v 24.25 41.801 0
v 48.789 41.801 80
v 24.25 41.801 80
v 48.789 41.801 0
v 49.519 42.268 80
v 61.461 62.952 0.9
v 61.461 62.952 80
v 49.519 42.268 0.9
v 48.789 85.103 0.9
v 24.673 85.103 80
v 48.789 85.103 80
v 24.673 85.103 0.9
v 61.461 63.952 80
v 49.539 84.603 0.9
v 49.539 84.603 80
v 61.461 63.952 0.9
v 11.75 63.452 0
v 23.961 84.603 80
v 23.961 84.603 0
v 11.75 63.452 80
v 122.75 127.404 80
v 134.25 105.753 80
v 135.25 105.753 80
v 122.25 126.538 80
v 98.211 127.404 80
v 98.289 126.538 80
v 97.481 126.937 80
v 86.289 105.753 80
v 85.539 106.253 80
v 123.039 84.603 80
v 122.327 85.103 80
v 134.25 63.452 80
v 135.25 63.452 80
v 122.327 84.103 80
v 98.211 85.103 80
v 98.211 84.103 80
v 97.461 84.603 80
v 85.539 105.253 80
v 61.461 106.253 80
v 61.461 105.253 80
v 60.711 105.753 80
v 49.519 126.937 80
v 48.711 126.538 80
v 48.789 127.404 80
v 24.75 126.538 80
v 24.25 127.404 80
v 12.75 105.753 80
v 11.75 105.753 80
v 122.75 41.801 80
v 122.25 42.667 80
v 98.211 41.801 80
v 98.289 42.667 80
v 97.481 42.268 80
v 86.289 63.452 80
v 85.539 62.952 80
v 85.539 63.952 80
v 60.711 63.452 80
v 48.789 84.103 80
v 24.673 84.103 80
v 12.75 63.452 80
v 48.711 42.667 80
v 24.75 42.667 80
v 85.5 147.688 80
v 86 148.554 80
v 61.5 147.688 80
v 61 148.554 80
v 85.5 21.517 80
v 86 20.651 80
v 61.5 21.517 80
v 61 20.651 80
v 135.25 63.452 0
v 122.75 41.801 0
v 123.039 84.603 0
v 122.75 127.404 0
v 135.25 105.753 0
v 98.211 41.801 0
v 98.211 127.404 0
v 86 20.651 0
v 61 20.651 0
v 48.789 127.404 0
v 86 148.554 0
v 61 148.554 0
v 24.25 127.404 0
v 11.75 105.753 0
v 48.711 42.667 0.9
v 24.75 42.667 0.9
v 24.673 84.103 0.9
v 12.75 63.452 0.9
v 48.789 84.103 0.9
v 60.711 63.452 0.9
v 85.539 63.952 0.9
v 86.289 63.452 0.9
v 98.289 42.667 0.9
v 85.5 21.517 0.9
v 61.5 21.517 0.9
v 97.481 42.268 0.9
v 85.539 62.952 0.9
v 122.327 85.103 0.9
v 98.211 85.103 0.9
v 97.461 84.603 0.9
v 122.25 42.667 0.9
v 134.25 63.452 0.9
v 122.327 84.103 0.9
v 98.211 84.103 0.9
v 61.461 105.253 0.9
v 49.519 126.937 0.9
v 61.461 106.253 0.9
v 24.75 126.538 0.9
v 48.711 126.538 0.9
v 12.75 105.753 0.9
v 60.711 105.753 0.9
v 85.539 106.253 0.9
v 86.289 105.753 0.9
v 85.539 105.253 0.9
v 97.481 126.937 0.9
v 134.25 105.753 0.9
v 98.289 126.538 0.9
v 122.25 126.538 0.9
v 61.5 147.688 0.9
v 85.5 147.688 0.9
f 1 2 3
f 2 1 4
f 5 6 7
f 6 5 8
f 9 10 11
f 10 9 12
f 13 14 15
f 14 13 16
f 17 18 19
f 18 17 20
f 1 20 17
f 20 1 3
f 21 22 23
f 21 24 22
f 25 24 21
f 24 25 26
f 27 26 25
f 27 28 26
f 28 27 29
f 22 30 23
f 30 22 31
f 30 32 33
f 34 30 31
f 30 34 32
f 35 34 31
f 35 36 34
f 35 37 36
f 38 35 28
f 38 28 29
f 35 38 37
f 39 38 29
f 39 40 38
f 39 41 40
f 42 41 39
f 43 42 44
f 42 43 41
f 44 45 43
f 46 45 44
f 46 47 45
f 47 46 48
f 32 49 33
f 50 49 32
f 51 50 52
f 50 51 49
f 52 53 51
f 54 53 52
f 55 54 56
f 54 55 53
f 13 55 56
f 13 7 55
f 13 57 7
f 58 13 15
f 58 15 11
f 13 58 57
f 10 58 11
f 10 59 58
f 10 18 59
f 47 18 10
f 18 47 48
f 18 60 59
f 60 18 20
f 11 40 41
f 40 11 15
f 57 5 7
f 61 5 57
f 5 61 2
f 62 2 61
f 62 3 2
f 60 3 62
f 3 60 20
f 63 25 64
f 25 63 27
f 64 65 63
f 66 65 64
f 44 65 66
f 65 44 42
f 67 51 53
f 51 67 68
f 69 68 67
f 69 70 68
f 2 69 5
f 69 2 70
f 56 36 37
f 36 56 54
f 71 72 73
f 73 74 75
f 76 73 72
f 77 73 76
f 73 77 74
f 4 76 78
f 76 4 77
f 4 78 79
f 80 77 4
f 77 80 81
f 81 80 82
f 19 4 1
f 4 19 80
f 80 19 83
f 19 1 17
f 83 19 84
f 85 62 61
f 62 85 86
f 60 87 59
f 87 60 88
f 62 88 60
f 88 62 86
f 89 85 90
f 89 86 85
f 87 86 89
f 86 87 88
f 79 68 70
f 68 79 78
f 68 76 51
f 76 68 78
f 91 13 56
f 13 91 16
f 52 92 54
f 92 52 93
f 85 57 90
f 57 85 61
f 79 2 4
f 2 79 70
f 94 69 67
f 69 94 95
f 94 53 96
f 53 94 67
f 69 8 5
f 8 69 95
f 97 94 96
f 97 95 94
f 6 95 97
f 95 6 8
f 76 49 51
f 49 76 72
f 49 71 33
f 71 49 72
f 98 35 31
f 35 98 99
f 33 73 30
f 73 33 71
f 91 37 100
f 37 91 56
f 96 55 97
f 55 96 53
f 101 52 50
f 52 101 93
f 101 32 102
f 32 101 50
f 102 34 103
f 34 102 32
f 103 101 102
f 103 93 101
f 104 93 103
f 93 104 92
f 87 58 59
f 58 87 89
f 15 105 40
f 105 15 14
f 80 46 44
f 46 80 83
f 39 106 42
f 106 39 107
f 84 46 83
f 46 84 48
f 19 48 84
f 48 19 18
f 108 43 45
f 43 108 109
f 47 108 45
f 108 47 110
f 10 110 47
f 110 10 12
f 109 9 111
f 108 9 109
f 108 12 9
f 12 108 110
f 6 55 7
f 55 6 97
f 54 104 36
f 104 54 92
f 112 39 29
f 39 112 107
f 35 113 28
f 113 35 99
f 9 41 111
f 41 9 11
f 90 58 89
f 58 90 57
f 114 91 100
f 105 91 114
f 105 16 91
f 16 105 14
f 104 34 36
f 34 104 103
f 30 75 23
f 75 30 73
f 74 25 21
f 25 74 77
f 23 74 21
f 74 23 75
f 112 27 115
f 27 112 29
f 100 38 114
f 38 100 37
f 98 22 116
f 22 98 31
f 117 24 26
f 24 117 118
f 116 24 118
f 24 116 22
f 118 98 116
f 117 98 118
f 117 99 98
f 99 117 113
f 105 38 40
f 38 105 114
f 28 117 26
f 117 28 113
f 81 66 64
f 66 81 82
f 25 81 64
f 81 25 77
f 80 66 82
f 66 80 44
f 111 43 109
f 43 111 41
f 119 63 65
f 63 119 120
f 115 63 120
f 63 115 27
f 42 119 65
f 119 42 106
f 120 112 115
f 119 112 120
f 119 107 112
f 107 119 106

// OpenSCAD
bd=50;
bh=80;
bt=2;
bb=0;
dx=bd*.735;
sides=6;
dy=(bd*cos(180/sides))-bt/2;
od=165;
ot=16;
for(y=[1:3])
  {
    xrange=y==3?[2]:[1:3];
    for(x=xrange)
    {
      translate([x*dx,y*dy+(dy*.5*(x%2))]) hex_cup(bd,bh,bt,0.9);
    }
  }
*difference(){
  *cylinder(d=od,h=bh,$fn=100);
  *translate([0,0,-.01]) cylinder(d=od-20,h=bh+1,$fn=100);
  translate([od*-.5,od*-.5]) cube([od,od,bh]);
  translate([od*-.5+ot,od*-.5+ot,-.01])
    cube([od-ot*2,od-ot*2,bh+2]);
  translate([od*-.5+ot/2+bt,od*-.5+bt+ot/2,1.6])
    minkowski(){
      translate([0,0,ot/2]) cube([od-bt*2-ot,od-bt*2-ot,bh]);
      sphere(ot/2);
    }
  *translate([0,0,1.6]) minkowski() {
    translate([0,0,10]) cylinder(d=od-bt-20,h=bh+1,$fn=100);
    sphere(10);
  }
  *translate([0,0,bb>0?bb:-.01])
    cylinder(d=od-bt,h=bh+1,$fn=100);
}
*intersection(){
  *cylinder(d=od,h=bh,$fn=100);
  translate([od*-.5,od*-.5]) cube([od,od,bh]);
translate([-55,dy*-.25]) {

  for(y=[-2:2])
  {
    for(x=[-1:4])
    {
      translate([x*dx,y*dy+(dy*.5*(x%2))]) hex_cup(bd,bh,bt,bb);
    }
  }
}
}
module hex_cup(d,h,t=1,back=0)
{
  difference(){
    cylinder(d=d,h=h,$fn=sides);
    translate([0,0,back>0?back:-.01])
      cylinder(d=d-t,h=h+0.02,$fn=sides);
  }
}
